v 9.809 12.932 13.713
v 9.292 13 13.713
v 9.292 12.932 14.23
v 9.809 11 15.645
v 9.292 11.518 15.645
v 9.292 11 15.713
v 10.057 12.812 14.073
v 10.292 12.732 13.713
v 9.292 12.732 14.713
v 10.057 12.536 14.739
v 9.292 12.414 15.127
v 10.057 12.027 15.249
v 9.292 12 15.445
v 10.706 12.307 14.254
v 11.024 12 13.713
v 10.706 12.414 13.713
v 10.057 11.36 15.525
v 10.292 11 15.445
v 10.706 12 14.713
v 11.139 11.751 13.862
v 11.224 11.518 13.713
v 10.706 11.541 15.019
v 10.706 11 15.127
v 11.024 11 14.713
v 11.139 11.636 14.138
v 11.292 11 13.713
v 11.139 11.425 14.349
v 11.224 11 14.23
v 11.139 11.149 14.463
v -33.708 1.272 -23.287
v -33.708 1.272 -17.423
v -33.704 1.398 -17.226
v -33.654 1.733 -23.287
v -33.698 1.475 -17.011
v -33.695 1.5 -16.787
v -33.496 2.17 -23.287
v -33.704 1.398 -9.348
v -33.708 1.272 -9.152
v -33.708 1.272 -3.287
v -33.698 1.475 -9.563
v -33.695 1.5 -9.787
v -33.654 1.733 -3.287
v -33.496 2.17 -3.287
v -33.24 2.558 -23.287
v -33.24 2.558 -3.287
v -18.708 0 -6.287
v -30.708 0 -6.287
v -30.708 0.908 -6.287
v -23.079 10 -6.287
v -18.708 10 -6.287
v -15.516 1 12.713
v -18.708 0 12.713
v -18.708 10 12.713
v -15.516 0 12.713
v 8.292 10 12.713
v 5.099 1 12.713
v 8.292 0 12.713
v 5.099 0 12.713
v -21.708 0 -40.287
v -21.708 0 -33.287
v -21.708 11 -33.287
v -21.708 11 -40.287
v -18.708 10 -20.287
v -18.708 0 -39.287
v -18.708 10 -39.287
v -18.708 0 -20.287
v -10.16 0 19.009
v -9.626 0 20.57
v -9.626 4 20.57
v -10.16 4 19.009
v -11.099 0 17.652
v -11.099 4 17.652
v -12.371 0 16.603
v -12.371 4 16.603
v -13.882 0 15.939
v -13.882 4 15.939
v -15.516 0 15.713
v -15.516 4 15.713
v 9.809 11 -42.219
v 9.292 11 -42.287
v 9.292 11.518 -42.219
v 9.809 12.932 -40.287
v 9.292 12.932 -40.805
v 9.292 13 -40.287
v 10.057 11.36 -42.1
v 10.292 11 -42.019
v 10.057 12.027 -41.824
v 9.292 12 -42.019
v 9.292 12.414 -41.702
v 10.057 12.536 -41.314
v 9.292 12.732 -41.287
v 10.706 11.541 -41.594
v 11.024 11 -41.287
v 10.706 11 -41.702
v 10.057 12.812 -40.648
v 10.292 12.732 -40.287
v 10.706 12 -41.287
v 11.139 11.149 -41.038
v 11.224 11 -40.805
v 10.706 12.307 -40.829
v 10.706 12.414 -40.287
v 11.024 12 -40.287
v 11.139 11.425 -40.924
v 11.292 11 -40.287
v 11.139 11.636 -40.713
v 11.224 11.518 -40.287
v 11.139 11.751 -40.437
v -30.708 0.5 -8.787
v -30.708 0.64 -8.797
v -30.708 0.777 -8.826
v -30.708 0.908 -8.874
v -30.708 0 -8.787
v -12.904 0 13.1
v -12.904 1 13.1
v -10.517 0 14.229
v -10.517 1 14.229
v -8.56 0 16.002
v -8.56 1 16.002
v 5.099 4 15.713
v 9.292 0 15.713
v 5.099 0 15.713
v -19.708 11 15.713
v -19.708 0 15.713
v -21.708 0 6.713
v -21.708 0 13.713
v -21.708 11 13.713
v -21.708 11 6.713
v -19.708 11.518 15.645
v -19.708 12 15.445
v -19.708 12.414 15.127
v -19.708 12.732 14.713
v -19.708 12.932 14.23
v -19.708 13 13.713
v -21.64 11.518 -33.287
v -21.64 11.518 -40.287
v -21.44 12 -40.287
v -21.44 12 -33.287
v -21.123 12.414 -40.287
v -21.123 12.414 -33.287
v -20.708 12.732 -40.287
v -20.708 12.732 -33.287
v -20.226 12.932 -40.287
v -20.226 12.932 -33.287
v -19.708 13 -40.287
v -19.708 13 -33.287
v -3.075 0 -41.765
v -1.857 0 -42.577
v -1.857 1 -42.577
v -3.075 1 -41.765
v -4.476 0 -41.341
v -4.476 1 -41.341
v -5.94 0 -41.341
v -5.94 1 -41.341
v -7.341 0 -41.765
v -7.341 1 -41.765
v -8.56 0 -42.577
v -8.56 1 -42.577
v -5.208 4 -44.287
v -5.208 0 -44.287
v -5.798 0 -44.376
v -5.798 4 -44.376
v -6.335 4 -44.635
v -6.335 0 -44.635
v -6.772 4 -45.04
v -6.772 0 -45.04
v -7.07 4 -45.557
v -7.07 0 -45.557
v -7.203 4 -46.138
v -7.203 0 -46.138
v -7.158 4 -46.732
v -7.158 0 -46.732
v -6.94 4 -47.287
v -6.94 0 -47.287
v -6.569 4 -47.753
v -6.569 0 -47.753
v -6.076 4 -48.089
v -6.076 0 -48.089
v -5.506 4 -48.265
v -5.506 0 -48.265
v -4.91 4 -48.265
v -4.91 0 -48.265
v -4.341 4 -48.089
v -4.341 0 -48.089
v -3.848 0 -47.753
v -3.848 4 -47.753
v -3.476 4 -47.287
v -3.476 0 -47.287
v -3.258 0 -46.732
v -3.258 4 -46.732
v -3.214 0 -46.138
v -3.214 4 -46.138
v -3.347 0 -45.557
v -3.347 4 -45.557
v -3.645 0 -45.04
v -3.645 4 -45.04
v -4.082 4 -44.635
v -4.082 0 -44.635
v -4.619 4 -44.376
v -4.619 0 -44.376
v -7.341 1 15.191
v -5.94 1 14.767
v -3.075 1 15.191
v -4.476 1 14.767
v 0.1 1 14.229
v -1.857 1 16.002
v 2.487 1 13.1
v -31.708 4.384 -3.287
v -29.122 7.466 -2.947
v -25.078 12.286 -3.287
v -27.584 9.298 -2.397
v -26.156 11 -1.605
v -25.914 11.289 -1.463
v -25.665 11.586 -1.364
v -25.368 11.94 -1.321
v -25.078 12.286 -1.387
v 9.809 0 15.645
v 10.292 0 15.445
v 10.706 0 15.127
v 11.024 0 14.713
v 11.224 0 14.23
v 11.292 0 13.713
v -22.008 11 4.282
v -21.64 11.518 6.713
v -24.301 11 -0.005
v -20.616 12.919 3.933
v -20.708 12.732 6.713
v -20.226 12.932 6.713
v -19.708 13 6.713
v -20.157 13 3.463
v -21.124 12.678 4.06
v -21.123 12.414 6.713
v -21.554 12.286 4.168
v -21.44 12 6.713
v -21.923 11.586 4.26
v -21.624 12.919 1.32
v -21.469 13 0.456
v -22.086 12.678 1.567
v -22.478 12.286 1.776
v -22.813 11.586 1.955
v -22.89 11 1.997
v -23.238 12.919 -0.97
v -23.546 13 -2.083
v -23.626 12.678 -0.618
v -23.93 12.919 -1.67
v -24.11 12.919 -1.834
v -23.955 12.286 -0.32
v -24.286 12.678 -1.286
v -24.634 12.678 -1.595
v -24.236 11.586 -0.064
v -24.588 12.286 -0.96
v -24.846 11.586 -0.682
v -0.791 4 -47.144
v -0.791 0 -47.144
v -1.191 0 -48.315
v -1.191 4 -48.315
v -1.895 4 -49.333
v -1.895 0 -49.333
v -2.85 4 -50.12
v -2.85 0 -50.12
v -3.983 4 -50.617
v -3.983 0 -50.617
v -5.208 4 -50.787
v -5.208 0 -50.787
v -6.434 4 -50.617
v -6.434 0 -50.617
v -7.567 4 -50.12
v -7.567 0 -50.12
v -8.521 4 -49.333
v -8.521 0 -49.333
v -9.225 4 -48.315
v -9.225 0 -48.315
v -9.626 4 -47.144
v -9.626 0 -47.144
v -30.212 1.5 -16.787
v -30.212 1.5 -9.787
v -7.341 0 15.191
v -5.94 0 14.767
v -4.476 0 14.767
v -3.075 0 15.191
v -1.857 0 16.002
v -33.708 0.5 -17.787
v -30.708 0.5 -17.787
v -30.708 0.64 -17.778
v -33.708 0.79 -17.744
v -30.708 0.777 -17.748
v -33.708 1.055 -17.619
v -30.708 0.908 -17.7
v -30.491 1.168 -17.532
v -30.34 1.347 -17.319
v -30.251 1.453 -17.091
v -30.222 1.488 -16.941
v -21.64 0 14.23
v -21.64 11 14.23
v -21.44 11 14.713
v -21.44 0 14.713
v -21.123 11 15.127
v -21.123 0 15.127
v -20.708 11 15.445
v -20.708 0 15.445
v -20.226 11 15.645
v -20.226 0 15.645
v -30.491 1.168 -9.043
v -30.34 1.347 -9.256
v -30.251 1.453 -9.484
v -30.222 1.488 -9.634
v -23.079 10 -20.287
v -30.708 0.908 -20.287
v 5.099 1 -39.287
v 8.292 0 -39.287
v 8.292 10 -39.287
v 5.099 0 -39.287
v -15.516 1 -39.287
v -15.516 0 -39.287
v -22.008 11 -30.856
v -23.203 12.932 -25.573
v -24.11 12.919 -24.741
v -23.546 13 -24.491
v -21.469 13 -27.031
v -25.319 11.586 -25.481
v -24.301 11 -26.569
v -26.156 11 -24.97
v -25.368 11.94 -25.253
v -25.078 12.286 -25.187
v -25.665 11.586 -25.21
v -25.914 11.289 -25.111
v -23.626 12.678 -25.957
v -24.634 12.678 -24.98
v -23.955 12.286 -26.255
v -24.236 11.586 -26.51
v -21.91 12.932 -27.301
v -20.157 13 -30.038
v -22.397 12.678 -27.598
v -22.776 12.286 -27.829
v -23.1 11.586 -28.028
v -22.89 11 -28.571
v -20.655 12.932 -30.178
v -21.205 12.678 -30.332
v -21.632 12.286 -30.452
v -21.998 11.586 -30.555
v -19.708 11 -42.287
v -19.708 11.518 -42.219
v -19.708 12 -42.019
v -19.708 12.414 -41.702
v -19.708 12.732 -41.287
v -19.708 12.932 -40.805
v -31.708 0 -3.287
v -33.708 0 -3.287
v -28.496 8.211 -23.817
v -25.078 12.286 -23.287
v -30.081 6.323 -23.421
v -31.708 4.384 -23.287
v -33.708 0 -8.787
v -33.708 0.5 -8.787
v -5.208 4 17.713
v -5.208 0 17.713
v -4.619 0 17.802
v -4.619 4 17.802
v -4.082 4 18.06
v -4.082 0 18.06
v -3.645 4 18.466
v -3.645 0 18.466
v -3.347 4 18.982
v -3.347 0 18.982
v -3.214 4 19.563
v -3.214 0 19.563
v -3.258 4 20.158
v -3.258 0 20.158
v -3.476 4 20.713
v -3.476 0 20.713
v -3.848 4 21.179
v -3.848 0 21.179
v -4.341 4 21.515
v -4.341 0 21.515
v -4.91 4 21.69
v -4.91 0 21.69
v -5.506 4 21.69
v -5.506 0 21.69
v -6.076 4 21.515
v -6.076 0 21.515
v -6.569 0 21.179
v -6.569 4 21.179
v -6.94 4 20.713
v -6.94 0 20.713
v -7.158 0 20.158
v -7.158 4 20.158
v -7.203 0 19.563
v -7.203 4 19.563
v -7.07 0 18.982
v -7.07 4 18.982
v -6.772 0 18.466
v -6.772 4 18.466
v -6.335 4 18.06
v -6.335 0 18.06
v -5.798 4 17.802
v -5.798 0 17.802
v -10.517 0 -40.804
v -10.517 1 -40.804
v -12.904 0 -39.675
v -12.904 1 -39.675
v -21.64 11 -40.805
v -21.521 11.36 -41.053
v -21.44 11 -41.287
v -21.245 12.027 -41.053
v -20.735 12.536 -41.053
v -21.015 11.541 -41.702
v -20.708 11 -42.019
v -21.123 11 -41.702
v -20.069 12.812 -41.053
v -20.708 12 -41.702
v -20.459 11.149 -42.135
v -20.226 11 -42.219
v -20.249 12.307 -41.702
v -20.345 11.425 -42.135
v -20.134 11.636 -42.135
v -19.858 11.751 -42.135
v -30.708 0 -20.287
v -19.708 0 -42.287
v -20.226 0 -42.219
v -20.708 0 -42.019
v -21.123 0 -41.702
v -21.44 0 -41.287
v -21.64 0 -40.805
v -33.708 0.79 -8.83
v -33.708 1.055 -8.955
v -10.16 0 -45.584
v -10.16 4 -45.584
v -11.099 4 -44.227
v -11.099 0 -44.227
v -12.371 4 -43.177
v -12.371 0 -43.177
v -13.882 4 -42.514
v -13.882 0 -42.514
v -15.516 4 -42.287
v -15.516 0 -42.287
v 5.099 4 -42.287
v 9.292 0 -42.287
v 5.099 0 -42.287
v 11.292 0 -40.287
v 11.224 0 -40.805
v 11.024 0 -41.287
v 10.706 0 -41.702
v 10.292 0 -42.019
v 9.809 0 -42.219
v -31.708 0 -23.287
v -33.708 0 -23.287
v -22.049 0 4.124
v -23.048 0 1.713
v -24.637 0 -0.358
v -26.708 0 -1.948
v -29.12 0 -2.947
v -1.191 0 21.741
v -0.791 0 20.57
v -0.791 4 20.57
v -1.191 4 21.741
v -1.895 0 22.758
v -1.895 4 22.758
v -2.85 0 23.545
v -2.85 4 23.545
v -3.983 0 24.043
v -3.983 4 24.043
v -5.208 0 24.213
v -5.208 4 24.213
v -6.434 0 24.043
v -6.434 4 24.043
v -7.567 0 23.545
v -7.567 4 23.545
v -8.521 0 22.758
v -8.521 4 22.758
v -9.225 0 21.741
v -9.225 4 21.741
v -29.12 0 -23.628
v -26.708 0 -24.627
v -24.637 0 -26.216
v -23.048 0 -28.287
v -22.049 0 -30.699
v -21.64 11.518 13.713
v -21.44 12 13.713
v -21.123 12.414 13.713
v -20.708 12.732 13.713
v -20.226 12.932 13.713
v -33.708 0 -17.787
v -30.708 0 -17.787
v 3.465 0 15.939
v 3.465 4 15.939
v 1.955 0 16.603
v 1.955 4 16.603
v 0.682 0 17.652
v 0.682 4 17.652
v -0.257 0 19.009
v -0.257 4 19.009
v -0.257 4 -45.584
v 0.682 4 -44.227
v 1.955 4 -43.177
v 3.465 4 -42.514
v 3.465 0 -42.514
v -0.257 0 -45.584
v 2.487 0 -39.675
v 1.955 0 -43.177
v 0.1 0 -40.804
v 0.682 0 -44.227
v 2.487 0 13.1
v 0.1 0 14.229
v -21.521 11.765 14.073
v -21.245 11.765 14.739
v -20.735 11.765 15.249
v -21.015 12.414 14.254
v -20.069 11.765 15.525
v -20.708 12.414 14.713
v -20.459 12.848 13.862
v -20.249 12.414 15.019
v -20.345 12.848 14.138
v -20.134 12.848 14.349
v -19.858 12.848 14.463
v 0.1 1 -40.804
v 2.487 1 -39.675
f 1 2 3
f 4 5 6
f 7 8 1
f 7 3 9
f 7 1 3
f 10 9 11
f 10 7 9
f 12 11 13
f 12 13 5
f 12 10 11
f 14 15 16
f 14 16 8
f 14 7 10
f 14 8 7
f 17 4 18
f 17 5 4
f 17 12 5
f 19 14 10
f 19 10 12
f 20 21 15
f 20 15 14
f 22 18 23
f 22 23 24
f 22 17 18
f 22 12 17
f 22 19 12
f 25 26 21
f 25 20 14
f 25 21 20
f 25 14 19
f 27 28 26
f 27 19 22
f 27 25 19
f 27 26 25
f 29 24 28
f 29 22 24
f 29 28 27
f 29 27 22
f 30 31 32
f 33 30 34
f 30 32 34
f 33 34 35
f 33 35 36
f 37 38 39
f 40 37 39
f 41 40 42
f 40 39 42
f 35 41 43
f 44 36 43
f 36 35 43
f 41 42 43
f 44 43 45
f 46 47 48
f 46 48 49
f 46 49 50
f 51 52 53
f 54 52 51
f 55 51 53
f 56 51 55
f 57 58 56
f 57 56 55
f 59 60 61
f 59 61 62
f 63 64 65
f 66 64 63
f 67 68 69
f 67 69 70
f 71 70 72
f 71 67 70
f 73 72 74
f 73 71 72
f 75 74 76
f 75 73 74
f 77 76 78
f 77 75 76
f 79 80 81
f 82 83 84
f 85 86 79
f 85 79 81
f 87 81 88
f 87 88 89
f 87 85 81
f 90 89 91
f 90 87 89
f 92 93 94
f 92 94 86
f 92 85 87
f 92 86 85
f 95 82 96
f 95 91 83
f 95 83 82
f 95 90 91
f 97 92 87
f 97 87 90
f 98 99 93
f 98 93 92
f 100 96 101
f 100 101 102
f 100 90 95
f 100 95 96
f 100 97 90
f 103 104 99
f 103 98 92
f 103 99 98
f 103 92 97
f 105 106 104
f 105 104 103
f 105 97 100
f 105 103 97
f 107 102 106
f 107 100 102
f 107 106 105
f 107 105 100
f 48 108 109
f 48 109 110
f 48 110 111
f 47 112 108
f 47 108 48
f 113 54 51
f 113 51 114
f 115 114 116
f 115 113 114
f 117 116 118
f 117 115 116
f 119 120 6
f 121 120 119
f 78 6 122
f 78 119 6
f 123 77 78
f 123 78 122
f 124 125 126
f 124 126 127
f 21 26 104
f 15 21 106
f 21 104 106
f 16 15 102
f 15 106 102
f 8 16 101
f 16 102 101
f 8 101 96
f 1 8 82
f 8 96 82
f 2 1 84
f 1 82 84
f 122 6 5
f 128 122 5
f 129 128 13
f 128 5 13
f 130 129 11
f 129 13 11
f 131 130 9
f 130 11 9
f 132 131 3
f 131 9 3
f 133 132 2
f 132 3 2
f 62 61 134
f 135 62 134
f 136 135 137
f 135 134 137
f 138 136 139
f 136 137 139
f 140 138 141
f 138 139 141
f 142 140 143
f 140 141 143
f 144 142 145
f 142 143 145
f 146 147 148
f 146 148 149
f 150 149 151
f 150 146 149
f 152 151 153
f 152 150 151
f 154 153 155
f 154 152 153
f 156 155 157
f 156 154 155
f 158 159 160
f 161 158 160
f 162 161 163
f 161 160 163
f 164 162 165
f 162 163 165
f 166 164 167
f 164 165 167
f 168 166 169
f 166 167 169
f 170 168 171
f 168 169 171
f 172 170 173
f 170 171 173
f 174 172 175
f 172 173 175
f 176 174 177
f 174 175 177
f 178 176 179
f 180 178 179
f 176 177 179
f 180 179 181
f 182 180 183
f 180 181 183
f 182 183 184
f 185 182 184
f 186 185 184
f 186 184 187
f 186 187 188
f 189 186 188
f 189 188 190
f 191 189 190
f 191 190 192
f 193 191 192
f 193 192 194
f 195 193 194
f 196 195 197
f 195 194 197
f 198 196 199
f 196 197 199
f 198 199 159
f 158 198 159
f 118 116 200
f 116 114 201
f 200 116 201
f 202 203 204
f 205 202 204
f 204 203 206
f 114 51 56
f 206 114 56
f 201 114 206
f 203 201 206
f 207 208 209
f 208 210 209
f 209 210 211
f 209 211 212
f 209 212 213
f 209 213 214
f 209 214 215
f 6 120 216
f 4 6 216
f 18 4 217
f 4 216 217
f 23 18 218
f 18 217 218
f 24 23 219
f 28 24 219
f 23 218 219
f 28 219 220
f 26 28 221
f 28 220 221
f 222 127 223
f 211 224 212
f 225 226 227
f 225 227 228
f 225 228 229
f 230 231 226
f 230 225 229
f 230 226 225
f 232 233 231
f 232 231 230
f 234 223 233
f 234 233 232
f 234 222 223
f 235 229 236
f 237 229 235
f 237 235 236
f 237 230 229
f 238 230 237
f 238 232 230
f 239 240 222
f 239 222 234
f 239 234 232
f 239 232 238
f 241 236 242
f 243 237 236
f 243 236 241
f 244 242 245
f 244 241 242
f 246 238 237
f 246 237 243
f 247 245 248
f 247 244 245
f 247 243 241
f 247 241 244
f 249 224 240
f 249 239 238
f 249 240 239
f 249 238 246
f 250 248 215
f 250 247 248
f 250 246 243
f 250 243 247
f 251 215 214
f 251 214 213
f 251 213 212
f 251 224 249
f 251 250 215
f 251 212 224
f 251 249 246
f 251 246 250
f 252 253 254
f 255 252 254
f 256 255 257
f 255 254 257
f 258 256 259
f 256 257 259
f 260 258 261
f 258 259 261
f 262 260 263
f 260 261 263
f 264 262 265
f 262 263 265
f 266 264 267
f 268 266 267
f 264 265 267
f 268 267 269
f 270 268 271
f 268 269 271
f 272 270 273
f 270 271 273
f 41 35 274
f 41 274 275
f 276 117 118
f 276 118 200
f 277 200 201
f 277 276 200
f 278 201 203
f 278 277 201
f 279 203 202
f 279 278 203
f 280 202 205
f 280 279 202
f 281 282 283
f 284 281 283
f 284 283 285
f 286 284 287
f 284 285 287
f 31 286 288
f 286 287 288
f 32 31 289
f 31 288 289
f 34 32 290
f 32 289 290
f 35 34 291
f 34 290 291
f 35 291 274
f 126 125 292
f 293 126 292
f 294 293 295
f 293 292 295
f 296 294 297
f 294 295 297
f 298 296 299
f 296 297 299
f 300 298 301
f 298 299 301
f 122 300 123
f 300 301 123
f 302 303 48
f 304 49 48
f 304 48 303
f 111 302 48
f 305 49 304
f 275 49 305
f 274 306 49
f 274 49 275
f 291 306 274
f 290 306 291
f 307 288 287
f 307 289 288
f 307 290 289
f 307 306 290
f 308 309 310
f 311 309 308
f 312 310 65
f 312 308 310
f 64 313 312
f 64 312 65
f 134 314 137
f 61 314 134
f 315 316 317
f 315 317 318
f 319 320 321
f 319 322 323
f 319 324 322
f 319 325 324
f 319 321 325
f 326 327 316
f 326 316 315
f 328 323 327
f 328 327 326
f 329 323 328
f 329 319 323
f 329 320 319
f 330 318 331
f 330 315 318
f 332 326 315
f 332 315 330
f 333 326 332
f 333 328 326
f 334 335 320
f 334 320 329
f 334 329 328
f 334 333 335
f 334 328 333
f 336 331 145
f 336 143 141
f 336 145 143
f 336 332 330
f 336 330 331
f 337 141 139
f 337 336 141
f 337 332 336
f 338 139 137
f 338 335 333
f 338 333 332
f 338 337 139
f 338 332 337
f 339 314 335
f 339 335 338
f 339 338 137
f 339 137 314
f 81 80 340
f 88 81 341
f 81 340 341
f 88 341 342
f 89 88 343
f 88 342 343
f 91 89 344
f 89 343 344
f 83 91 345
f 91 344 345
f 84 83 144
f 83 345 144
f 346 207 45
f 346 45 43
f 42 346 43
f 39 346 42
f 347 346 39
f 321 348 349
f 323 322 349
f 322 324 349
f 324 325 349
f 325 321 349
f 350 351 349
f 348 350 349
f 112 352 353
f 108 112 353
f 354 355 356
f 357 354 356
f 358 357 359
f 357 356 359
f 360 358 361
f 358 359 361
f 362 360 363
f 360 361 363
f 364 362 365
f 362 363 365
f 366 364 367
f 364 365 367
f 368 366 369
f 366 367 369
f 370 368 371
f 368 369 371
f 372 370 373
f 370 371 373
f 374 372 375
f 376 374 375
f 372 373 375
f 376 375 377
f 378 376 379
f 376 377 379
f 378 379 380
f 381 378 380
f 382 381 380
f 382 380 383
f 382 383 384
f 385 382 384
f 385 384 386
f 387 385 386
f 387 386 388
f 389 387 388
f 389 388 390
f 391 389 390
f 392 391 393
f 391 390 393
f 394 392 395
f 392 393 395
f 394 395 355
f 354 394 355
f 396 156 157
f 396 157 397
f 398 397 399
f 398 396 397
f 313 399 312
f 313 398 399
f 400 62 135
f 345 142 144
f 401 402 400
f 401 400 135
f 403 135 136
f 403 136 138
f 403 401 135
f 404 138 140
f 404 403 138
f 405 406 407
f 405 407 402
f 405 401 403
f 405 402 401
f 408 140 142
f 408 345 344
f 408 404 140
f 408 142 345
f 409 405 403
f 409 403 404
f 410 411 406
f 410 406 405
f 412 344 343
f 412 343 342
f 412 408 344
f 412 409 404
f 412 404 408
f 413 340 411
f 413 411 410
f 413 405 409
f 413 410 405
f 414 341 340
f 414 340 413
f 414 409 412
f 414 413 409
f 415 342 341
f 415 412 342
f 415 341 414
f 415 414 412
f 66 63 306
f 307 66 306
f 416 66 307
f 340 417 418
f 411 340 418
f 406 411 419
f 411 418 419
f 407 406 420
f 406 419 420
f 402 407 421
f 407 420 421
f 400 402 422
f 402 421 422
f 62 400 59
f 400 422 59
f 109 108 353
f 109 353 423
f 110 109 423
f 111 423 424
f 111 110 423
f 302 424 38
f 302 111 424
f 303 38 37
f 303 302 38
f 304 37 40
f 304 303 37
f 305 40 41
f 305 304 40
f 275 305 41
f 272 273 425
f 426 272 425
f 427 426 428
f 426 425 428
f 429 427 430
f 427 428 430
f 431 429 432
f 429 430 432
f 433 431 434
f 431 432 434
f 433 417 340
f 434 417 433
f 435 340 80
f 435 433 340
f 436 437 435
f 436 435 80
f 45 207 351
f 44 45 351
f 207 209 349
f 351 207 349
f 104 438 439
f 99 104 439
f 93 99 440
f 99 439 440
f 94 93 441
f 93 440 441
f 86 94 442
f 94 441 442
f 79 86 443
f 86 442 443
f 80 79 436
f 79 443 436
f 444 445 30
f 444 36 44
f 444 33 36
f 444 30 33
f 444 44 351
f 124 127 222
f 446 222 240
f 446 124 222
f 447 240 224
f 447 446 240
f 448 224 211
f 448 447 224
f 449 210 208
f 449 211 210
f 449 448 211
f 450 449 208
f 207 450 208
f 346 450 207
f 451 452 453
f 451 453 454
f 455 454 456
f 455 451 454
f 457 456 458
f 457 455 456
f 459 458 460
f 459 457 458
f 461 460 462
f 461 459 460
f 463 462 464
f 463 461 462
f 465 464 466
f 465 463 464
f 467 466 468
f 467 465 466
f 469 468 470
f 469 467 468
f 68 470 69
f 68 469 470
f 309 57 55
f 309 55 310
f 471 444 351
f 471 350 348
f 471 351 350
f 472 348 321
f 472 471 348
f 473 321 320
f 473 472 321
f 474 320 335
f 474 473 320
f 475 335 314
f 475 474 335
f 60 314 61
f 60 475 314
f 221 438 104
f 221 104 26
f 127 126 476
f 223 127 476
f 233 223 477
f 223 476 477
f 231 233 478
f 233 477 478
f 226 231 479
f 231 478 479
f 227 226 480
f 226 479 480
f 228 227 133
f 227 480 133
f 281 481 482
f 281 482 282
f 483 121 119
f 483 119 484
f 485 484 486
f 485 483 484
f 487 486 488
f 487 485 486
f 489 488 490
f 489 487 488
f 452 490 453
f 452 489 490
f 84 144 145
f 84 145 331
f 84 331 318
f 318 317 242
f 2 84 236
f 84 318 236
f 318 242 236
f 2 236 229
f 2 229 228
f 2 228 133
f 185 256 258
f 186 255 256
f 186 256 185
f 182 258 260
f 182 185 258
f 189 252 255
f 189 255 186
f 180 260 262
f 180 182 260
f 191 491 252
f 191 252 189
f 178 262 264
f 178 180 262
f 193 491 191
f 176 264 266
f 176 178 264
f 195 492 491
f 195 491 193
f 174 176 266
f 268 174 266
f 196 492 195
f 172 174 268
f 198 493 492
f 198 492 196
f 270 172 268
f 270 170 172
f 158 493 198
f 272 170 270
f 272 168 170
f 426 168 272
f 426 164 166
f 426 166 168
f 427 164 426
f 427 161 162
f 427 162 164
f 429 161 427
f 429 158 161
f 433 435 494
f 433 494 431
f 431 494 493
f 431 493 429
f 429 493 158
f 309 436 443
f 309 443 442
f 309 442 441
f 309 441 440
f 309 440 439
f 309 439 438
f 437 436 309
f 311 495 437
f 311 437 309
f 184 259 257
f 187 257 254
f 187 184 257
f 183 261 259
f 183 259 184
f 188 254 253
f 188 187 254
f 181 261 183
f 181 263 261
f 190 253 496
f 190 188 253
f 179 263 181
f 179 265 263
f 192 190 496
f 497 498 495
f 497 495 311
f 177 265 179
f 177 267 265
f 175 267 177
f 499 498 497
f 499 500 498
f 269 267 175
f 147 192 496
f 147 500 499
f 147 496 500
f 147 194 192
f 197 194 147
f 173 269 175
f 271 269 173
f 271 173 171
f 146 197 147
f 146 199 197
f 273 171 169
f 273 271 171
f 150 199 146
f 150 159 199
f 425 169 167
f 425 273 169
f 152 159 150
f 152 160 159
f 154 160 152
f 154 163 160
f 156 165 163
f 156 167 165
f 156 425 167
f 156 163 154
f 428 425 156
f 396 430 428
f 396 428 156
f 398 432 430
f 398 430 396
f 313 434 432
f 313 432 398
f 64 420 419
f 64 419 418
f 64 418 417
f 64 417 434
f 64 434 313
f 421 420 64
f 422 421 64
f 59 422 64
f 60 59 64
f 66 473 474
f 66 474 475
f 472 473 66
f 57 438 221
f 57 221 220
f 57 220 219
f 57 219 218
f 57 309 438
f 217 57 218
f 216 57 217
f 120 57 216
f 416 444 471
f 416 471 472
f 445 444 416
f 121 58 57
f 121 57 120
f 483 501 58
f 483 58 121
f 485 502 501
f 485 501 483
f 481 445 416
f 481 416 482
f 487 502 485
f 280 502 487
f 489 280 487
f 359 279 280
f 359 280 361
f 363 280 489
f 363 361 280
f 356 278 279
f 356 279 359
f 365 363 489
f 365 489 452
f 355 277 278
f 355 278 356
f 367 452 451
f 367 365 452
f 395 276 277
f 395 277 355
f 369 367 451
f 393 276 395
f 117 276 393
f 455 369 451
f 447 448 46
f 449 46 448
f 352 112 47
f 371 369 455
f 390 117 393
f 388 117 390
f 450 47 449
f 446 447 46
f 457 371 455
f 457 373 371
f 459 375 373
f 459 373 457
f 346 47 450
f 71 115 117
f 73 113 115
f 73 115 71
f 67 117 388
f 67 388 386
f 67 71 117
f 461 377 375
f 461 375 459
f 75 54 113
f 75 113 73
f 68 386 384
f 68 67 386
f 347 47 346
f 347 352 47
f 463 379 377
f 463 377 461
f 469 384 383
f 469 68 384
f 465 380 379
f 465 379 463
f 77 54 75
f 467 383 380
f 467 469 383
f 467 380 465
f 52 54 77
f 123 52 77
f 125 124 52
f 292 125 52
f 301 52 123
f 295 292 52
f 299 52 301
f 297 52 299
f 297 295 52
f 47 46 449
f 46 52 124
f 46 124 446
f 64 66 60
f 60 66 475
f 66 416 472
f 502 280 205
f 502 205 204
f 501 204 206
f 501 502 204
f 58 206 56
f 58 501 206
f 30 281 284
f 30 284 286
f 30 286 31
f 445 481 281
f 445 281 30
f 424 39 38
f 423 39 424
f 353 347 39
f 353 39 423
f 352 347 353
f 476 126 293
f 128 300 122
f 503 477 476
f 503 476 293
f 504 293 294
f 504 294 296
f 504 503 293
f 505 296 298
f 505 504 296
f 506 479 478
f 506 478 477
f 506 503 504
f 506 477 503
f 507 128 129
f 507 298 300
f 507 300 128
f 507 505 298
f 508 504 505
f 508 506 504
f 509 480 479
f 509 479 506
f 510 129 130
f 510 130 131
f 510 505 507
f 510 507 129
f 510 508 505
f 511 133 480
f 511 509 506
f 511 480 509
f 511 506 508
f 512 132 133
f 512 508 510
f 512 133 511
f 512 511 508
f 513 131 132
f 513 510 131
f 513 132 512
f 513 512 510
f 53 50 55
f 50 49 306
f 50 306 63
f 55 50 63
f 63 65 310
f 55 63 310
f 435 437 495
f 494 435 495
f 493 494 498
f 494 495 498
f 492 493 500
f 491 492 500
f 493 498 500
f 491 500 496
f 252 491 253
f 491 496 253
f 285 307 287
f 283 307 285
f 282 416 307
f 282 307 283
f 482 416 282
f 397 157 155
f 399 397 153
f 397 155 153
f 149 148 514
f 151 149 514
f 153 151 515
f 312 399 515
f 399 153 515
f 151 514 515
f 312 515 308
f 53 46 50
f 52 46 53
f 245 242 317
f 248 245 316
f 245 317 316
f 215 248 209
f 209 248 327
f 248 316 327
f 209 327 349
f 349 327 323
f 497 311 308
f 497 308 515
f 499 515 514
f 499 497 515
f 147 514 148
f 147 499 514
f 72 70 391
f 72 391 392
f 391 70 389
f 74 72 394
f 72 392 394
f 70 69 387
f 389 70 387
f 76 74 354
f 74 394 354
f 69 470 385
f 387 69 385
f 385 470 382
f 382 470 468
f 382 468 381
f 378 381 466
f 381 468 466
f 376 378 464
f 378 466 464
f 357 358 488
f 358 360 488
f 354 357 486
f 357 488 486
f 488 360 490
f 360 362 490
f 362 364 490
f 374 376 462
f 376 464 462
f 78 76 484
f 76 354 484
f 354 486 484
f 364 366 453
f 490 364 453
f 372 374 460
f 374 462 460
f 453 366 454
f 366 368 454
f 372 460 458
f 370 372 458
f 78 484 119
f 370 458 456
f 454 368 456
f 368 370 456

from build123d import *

# Parameters (mm, degrees)
BOSS_EXTRU_1_DEPTH      = 13
ESQUISSE2_R             = 2
BOSS_EXTRU_2_DEPTH      = 4
CHANFREIN2_SIZE         = 11
CHANFREIN2_SIZE2        = 9.230095943
COQUE1_DEPTH            = 0.908089297
COQUE1_2_DEPTH          = 1
COQUE1_START            = -39.287350261
COQUE1_3_OUTLINE_W      = 27
COQUE1_3_OUTLINE_H      = 9.091910703
COQUE1_3_DEPTH          = 52
COQUE1_START_2          = -20.287350261
COQUE1_4_DEPTH          = 14
CONG_4_R                = 10
ESQUISSE3_W             = 9
ESQUISSE3_H             = 1.5
ENL_V_MAT_EXTRU_1_DEPTH = 10
CONG_2_R                = 1
CONG_3_R                = 2


with BuildPart() as part:
    # Esquisse1 → Boss.-Extru.1 (new body)
    with BuildSketch(Plane(origin=(0, 0, 0), x_dir=(1, 0, 0), z_dir=(0, 1, 0))):
        Polygon((-21.708301388, 3.287350261), (-33.708301388, 3.287350261), (-33.708301388, 23.287350261), (-21.708301388, 23.287350261), (-21.708301388, 42.287350261), (11.291698612, 42.287350261), (11.291698612, -15.712649739), (-21.708301388, -15.712649739), align=None)
    extrude(amount=BOSS_EXTRU_1_DEPTH)

    # Esquisse2 → Boss.-Extru.2 (add)
    # profile 1 of 2: a face of its own
    with BuildSketch(Plane.XZ):
        with BuildLine():
            Line((-17.708301388, 12.712649739), (7.291698612, 12.712649739))
            Line((7.291698612, 12.712649739), (7.291698612, 15.712649739))
            Line((7.291698612, 15.712649739), (5.099462676, 15.712649739))
            ThreePointArc((5.099462676, 15.712649739), (1.282208614, 17.08354924), (-0.790688218, 20.569792596))
            ThreePointArc((-0.790688218, 20.569792596), (-5.208301388, 24.212649739), (-9.625914558, 20.569792596))
            ThreePointArc((-9.625914558, 20.569792596), (-11.698811391, 17.08354924), (-15.516065452, 15.712649739))
            Line((-15.516065452, 15.712649739), (-17.708301388, 15.712649739))
            Line((-17.708301388, 15.712649739), (-17.708301388, 12.712649739))
        make_face()
        with Locations(Location((-5.208301388, 19.712649739, 0), (0, 0, 270))):
            Circle(ESQUISSE2_R, mode=Mode.SUBTRACT)
    # profile 2 of 2: a face of its own
    with BuildSketch(Plane.XZ):
        with BuildLine():
            Line((-17.708301388, -42.287350261), (-17.708301388, -39.287350261))
            Line((-17.708301388, -39.287350261), (7.291698612, -39.287350261))
            Line((7.291698612, -39.287350261), (7.291698612, -42.287350261))
            Line((7.291698612, -42.287350261), (5.099462676, -42.287350261))
            ThreePointArc((5.099462676, -42.287350261), (1.282208614, -43.658249762), (-0.790688218, -47.144493118))
            ThreePointArc((-0.790688218, -47.144493118), (-5.208301388, -50.787350261), (-9.625914558, -47.144493118))
            ThreePointArc((-9.625914558, -47.144493118), (-11.698811391, -43.658249762), (-15.516065452, -42.287350261))
            Line((-15.516065452, -42.287350261), (-17.708301388, -42.287350261))
        make_face()
        with Locations(Location((-5.208301388, -46.287350261, 0), (0, 0, 90))):
            Circle(ESQUISSE2_R, mode=Mode.SUBTRACT)
    extrude(amount=-BOSS_EXTRU_2_DEPTH)

    # Chanfrein2
    chanfrein2_edges = [part.edges().sort_by_distance(p)[0] for p in [
        (-33.708301388, 13, -13.287350261),
    ]]
    chanfrein2_side = [part.faces().sort_by_distance(p)[0] for p in [
        (-33.708301388, 6.5, -13.287350261),
    ]]
    chamfer(chanfrein2_edges, length=CHANFREIN2_SIZE, length2=CHANFREIN2_SIZE2, reference=chanfrein2_side[0])

    # Coque1: read off the stored shape, not the designer's step
    # Coque1 outline → Coque1 (cut)
    with BuildSketch(Plane(origin=(0, 0, 0), x_dir=(1, 0, 0), z_dir=(0, 1, 0))):
        with BuildLine():
            Line((-18.708301388, 6.287350261), (-18.708301388, -12.712649739))
            Line((-18.708301388, -12.712649739), (-15.516065452, -12.712649739))
            ThreePointArc((-15.516065452, -12.712649739), (-11.668627484, -13.57648227), (-8.559754422, -16.002156165))
            ThreePointArc((-8.559754422, -16.002156165), (-5.208301388, -14.712649739), (-1.856848354, -16.002156165))
            ThreePointArc((-1.856848354, -16.002156165), (1.252024708, -13.57648227), (5.099462676, -12.712649739))
            Line((5.099462676, -12.712649739), (8.291698612, -12.712649739))
            Line((8.291698612, -12.712649739), (8.291698612, 39.287350261))
            Line((8.291698612, 39.287350261), (5.099462676, 39.287350261))
            ThreePointArc((5.099462676, 39.287350261), (1.252024708, 40.151182792), (-1.856848354, 42.576856687))
            ThreePointArc((-1.856848354, 42.576856687), (-5.208301388, 41.287350261), (-8.559754422, 42.576856687))
            ThreePointArc((-8.559754422, 42.576856687), (-11.668627484, 40.151182792), (-15.516065452, 39.287350261))
            Line((-15.516065452, 39.287350261), (-18.708301388, 39.287350261))
            Line((-18.708301388, 39.287350261), (-18.708301388, 20.287350261))
            Line((-18.708301388, 20.287350261), (-30.708301388, 20.287350261))
            Line((-30.708301388, 20.287350261), (-30.708301388, 6.287350261))
            Line((-30.708301388, 6.287350261), (-18.708301388, 6.287350261))
        make_face()
    extrude(amount=COQUE1_DEPTH, mode=Mode.SUBTRACT)

    # Coque1 2 outline → Coque1 2 (cut)
    with BuildSketch(Plane(origin=(0, 0, 0), x_dir=(1, 0, 0), z_dir=(0, 1, 0))):
        with BuildLine():
            Line((5.099462676, -12.712649739), (-15.516065452, -12.712649739))
            ThreePointArc((-15.516065452, -12.712649739), (-11.668627484, -13.57648227), (-8.559754422, -16.002156165))
            ThreePointArc((-8.559754422, -16.002156165), (-5.208301388, -14.712649739), (-1.856848354, -16.002156165))
            ThreePointArc((-1.856848354, -16.002156165), (1.252024708, -13.57648227), (5.099462676, -12.712649739))
        make_face()
        with BuildLine():
            Line((-15.516065452, 39.287350261), (5.099462676, 39.287350261))
            ThreePointArc((5.099462676, 39.287350261), (1.252024708, 40.151182792), (-1.856848354, 42.576856687))
            ThreePointArc((-1.856848354, 42.576856687), (-5.208301388, 41.287350261), (-8.559754422, 42.576856687))
            ThreePointArc((-8.559754422, 42.576856687), (-11.668627484, 40.151182792), (-15.516065452, 39.287350261))
        make_face()
    extrude(amount=COQUE1_2_DEPTH, mode=Mode.SUBTRACT)

    # Coque1 3 outline → Coque1 3 (cut)
    with BuildSketch(Plane.XY.offset(COQUE1_START)):
        with Locations((-5.208301388, 5.454044649)):
            Rectangle(COQUE1_3_OUTLINE_W, COQUE1_3_OUTLINE_H)
    extrude(amount=COQUE1_3_DEPTH, mode=Mode.SUBTRACT)

    # Coque1 4 outline → Coque1 4 (cut)
    with BuildSketch(Plane.XY.offset(COQUE1_START_2)):
        Polygon((-30.708301388, 0.908089297), (-18.708301388, 0.908089297), (-18.708301388, 10), (-23.079282471, 10), align=None)
    extrude(amount=COQUE1_4_DEPTH, mode=Mode.SUBTRACT)

    # Congé4
    # the kernel refuses this fillet: 10 mm, written as the material it adds along each edge
    with BuildSketch(Plane(origin=(-21.708301388, 0, -3.287350261), x_dir=(-1, 0, 0), z_dir=(0, 1, 0))) as cong_4_piece_1_section:
        with BuildLine():
            CenterArc((CONG_4_R, CONG_4_R), CONG_4_R, 180, 90)
            Line((0, CONG_4_R), (0, 0))
            Line((0, 0), (CONG_4_R, 0))
        make_face()
    cong_4_piece_1 = extrude(amount=13, mode=Mode.PRIVATE)
    cong_4_piece_1 = split(cong_4_piece_1, bisect_by=Plane(origin=(-29.734998207, 6.73519834, -3.287350261), z_dir=(0.7660444431189771, -0.6427876096865405, 0)), keep=Keep.TOP, mode=Mode.PRIVATE)
    add(cong_4_piece_1)
    with BuildSketch(Plane(origin=(-21.708301388, 0, -23.287350261), x_dir=(0, 0, -1), z_dir=(0, 1, 0))) as cong_4_piece_2_section:
        with BuildLine():
            CenterArc((CONG_4_R, CONG_4_R), CONG_4_R, 180, 90)
            Line((0, CONG_4_R), (0, 0))
            Line((0, 0), (CONG_4_R, 0))
        make_face()
    cong_4_piece_2 = extrude(amount=13, mode=Mode.PRIVATE)
    cong_4_piece_2 = split(cong_4_piece_2, bisect_by=Plane(origin=(-29.734998207, 6.73519834, -23.287350261), z_dir=(0.7660444431189771, -0.6427876096865405, 0)), keep=Keep.TOP, mode=Mode.PRIVATE)
    add(cong_4_piece_2)

    # Esquisse3 → Enlèv. mat.-Extru.1 (cut)
    with BuildSketch(Plane.ZY.offset(33.708301388)):
        with Locations((-13.287350261, 0.75)):
            Rectangle(ESQUISSE3_W, ESQUISSE3_H)
    extrude(amount=-ENL_V_MAT_EXTRU_1_DEPTH, mode=Mode.SUBTRACT)

    # Congé2
    cong_2_edges = [part.edges().sort_by_distance(p)[0] for p in [
        (-31.959965362, 1.5, -8.787350261),
        (-31.959965362, 1.5, -17.787350261),
    ]]
    fillet(cong_2_edges, radius=CONG_2_R)

    # Congé3
    # the kernel refuses this fillet: 2 mm, written as the material it takes off along each edge
    with BuildSketch(Plane(origin=(9.291698612, 11, -40.287350261), x_dir=(0, 0, -1), z_dir=(1, 0, 0))) as cong_3_piece_1_section:
        Polygon((0, 0), (CONG_3_R, 0), (CONG_3_R, CONG_3_R), (0, CONG_3_R), align=None)
    cong_3_piece_1 = extrude(amount=CONG_3_R, mode=Mode.PRIVATE)
    cong_3_piece_1 = cong_3_piece_1 - Plane(origin=(9.291698612, 11, -40.287350261), x_dir=(0, -0.7071067811865475, 0.7071067811865475), z_dir=(1, 0, 0)) * Sphere(CONG_3_R, mode=Mode.PRIVATE)
    add(cong_3_piece_1, mode=Mode.SUBTRACT)
    with BuildSketch(Plane(origin=(9.291698612, 11, 13.712649739), x_dir=(0, 1, 0), z_dir=(1, 0, 0))) as cong_3_piece_2_section:
        Polygon((0, 0), (CONG_3_R, 0), (CONG_3_R, CONG_3_R), (0, CONG_3_R), align=None)
    cong_3_piece_2 = extrude(amount=CONG_3_R, mode=Mode.PRIVATE)
    cong_3_piece_2 = cong_3_piece_2 - Plane(origin=(9.291698612, 11, 13.712649739), x_dir=(0, -0.7071067811865475, -0.7071067811865475), z_dir=(1, 0, 0)) * Sphere(CONG_3_R, mode=Mode.PRIVATE)
    add(cong_3_piece_2, mode=Mode.SUBTRACT)
    with BuildSketch(Plane(origin=(-19.708301388, 11, 13.712649739), x_dir=(-1, 0, 0), z_dir=(0, 1, 0))) as cong_3_piece_3_section:
        Polygon((0, 0), (CONG_3_R, 0), (CONG_3_R, CONG_3_R), (0, CONG_3_R), align=None)
    cong_3_piece_3 = extrude(amount=CONG_3_R, mode=Mode.PRIVATE)
    cong_3_piece_3 = cong_3_piece_3 - Plane(origin=(-19.708301388, 11, 13.712649739), x_dir=(0.7071067811865475, 0, -0.7071067811865475), z_dir=(0, 1, 0)) * Sphere(CONG_3_R, mode=Mode.PRIVATE)
    add(cong_3_piece_3, mode=Mode.SUBTRACT)
    with BuildSketch(Plane(origin=(-19.708301388, 11, -40.287350261), x_dir=(-1, 0, 0), z_dir=(0, 0, -1))) as cong_3_piece_4_section:
        Polygon((0, 0), (CONG_3_R, 0), (CONG_3_R, CONG_3_R), (0, CONG_3_R), align=None)
    cong_3_piece_4 = extrude(amount=CONG_3_R, mode=Mode.PRIVATE)
    cong_3_piece_4 = cong_3_piece_4 - Plane(origin=(-19.708301388, 11, -40.287350261), x_dir=(0.7071067811865475, -0.7071067811865475, 0), z_dir=(0, 0, -1)) * Sphere(CONG_3_R, mode=Mode.PRIVATE)
    add(cong_3_piece_4, mode=Mode.SUBTRACT)
    with BuildSketch(Plane(origin=(11.291698612, -5, -42.287350261), x_dir=(0, 0, 1), z_dir=(0, 1, 0)), Plane(origin=(11.291698612, -5, 15.712649739), x_dir=(-1, 0, 0), z_dir=(0, 1, 0)), Plane(origin=(-21.708301388, -5, 15.712649739), x_dir=(0, 0, -1), z_dir=(0, 1, 0)), Plane(origin=(-21.708301388, -5, -42.287350261), x_dir=(1, 0, 0), z_dir=(0, 1, 0))) as cong_3_piece_5:
        with BuildLine():
            CenterArc((CONG_3_R, -CONG_3_R), CONG_3_R, 90, 90)
            Line((0, -CONG_3_R), (0, 0))
            Line((0, 0), (CONG_3_R, 0))
        make_face()
    extrude(amount=16, mode=Mode.SUBTRACT)
    with BuildSketch(Plane(origin=(11.291698612, 13, -40.287350261), x_dir=(0, -1, 0), z_dir=(0, 0, 1))) as cong_3_piece_6:
        with BuildLine():
            CenterArc((CONG_3_R, -CONG_3_R), CONG_3_R, 90, 90)
            Line((0, -CONG_3_R), (0, 0))
            Line((0, 0), (CONG_3_R, 0))
        make_face()
    extrude(amount=54, mode=Mode.SUBTRACT)
    with BuildSketch(Plane(origin=(9.291698612, 13, 15.712649739), x_dir=(0, -1, 0), z_dir=(-1, 0, 0)), Plane(origin=(-19.708301388, 13, -42.287350261), x_dir=(0, -1, 0), z_dir=(1, 0, 0))) as cong_3_piece_7:
        with BuildLine():
            CenterArc((CONG_3_R, -CONG_3_R), CONG_3_R, 90, 90)
            Line((0, -CONG_3_R), (0, 0))
            Line((0, 0), (CONG_3_R, 0))
        make_face()
    extrude(amount=29, mode=Mode.SUBTRACT)
    with BuildSketch(Plane(origin=(-21.708301388, 13, 13.712649739), x_dir=(0, -1, 0), z_dir=(0, 0, -1)), Plane(origin=(-21.708301388, 13, -33.287350261), x_dir=(0, -1, 0), z_dir=(0, 0, -1))) as cong_3_piece_8:
        with BuildLine():
            CenterArc((CONG_3_R, -CONG_3_R), CONG_3_R, 90, 90)
            Line((0, -CONG_3_R), (0, 0))
            Line((0, 0), (CONG_3_R, 0))
        make_face()
    extrude(amount=7, mode=Mode.SUBTRACT)
    with BuildSketch(Plane(origin=(-33.708301388, 2, -1.46749909), x_dir=(0, -1, 0), z_dir=(0, 0, -1))) as cong_3_piece_9:
        with BuildLine():
            CenterArc((CONG_3_R * 0.363970234266, -CONG_3_R), CONG_3_R, 90, 40)
            Line((-CONG_3_R * 0.27881737542, -CONG_3_R * 0.233955556881), (0, 0))
            Line((0, 0), (CONG_3_R * 0.363970234266, 0))
        make_face()
    extrude(amount=23.639702343, mode=Mode.SUBTRACT)
    with BuildSketch(Plane(origin=(-24.478205445, 13, -28.710508665), x_dir=(-0.642787609686802, -0.7660444431187577, 0), z_dir=(0, 0, 1))) as cong_3_piece_10:
        with BuildLine():
            CenterArc((CONG_3_R * 0.466307658155, CONG_3_R), CONG_3_R, 220, 50)
            Line((-CONG_3_R * 0.299736784964, CONG_3_R * 0.357212390313), (0, 0))
            Line((0, 0), (CONG_3_R * 0.466307658155, 0))
        make_face()
    extrude(amount=30.846316809, mode=Mode.SUBTRACT)
    with BuildSketch(Plane(origin=(-31.708301388, 13, 6.712649739), x_dir=(1, 0, 0), z_dir=(0, 0, 1))) as cong_3_piece_11:
        with BuildLine():
            CenterArc((10 + CONG_3_R, -CONG_3_R), CONG_3_R, 90, 90)
            Line((10 + CONG_3_R, 0), (10, 0))
            Line((10, 0), (10, -CONG_3_R))
        make_face()
    revolve(axis=Axis((-31.708301388, 13, 6.712649739), (0, 1, 0)), revolution_arc=72.347081519, mode=Mode.SUBTRACT)
    with BuildSketch(Plane(origin=(-31.708301388, 13, -33.287350261), x_dir=(0.3032501302035069, 0, 0.9529109919250359), z_dir=(-0.9529109919250359, 0, 0.3032501302035069))) as cong_3_piece_12:
        with BuildLine():
            CenterArc((10 + CONG_3_R, -CONG_3_R), CONG_3_R, 90, 90)
            Line((10 + CONG_3_R, 0), (10, 0))
            Line((10, 0), (10, -CONG_3_R))
        make_face()
    revolve(axis=Axis((-31.708301388, 13, -33.287350261), (0, 1, 0)), revolution_arc=72.347081519, mode=Mode.SUBTRACT)


solid = part.part
